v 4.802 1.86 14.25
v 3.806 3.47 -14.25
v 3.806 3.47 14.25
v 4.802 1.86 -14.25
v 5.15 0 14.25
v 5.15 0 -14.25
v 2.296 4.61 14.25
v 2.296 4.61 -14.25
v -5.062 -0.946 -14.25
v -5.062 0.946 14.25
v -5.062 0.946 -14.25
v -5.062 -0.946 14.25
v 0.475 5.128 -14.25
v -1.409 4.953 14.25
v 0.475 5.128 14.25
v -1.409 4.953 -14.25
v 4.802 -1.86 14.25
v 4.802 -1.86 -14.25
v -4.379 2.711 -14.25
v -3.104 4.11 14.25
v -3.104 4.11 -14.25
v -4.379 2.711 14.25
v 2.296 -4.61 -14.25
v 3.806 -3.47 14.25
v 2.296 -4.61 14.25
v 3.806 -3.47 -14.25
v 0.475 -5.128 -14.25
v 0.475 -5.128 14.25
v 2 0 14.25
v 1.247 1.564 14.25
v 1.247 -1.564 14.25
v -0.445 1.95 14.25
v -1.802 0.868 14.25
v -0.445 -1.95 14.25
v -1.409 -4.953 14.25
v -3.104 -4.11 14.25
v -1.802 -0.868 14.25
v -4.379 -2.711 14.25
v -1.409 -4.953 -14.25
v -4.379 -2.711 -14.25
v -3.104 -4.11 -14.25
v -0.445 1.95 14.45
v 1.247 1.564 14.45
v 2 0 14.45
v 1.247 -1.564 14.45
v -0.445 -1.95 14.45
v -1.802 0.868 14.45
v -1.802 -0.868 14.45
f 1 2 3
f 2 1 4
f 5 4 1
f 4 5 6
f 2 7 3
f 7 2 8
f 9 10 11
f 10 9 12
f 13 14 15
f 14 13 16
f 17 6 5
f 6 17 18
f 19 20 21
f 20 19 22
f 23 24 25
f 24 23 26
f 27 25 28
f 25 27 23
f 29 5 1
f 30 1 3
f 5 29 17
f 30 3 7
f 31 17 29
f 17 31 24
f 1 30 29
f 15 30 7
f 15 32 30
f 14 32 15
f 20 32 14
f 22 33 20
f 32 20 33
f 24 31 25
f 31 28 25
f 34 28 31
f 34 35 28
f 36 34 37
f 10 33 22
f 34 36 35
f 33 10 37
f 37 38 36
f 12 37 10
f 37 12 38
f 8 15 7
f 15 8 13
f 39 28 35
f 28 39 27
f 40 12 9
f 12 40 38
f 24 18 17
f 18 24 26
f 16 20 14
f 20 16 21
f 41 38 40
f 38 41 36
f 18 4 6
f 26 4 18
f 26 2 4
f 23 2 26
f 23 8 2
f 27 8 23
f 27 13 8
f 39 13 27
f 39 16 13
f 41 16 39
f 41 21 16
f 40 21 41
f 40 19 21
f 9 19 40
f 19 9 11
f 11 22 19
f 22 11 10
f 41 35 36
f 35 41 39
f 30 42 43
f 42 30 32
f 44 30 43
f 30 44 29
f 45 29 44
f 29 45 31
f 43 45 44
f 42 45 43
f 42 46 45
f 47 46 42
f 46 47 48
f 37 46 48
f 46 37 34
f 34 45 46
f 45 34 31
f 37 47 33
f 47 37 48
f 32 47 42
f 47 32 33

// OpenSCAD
// Parameters
height_mm = 28.5; //[14.25:57:0.1]
diameter_mm = 10.3; //[5.15:20.6:0.1]
positive_terminal_height_mm = 1; //[0.5:2:0.1]
positive_terminal_diameter_mm = 4; //[2:8:0.1]
negative_terminal_height_mm = 0.3; //[0.15:0.6:0.05]
negative_terminal_diameter_mm = 6; //[3:12:0.1]
overlap_mm = 0.8; //[0.2:2:0.1]
centered = 1; //[0:1:1]

// Battery - complete geometry
module battery() {
  union() {
    // Battery Cell Body
    color("DimGray") {
      translate([0, 0, 0])
        cylinder(h=height_mm, r=diameter_mm/2, center=true);
    }
    // Positive Terminal Cap
    color("Silver") {
      translate([0, 0, height_mm/2 + positive_terminal_height_mm/2 - overlap_mm])
        cylinder(h=positive_terminal_height_mm, r=positive_terminal_diameter_mm/2, center=true);
    }
    // Negative Terminal Contact
    color("Silver") {
      translate([0, 0, -height_mm/2 - negative_terminal_height_mm/2 + overlap_mm])
        cylinder(h=negative_terminal_height_mm, r=negative_terminal_diameter_mm/2, center=true);
    }
  }
}

// Assembly
module assembly() {
  battery();
}

assembly();
